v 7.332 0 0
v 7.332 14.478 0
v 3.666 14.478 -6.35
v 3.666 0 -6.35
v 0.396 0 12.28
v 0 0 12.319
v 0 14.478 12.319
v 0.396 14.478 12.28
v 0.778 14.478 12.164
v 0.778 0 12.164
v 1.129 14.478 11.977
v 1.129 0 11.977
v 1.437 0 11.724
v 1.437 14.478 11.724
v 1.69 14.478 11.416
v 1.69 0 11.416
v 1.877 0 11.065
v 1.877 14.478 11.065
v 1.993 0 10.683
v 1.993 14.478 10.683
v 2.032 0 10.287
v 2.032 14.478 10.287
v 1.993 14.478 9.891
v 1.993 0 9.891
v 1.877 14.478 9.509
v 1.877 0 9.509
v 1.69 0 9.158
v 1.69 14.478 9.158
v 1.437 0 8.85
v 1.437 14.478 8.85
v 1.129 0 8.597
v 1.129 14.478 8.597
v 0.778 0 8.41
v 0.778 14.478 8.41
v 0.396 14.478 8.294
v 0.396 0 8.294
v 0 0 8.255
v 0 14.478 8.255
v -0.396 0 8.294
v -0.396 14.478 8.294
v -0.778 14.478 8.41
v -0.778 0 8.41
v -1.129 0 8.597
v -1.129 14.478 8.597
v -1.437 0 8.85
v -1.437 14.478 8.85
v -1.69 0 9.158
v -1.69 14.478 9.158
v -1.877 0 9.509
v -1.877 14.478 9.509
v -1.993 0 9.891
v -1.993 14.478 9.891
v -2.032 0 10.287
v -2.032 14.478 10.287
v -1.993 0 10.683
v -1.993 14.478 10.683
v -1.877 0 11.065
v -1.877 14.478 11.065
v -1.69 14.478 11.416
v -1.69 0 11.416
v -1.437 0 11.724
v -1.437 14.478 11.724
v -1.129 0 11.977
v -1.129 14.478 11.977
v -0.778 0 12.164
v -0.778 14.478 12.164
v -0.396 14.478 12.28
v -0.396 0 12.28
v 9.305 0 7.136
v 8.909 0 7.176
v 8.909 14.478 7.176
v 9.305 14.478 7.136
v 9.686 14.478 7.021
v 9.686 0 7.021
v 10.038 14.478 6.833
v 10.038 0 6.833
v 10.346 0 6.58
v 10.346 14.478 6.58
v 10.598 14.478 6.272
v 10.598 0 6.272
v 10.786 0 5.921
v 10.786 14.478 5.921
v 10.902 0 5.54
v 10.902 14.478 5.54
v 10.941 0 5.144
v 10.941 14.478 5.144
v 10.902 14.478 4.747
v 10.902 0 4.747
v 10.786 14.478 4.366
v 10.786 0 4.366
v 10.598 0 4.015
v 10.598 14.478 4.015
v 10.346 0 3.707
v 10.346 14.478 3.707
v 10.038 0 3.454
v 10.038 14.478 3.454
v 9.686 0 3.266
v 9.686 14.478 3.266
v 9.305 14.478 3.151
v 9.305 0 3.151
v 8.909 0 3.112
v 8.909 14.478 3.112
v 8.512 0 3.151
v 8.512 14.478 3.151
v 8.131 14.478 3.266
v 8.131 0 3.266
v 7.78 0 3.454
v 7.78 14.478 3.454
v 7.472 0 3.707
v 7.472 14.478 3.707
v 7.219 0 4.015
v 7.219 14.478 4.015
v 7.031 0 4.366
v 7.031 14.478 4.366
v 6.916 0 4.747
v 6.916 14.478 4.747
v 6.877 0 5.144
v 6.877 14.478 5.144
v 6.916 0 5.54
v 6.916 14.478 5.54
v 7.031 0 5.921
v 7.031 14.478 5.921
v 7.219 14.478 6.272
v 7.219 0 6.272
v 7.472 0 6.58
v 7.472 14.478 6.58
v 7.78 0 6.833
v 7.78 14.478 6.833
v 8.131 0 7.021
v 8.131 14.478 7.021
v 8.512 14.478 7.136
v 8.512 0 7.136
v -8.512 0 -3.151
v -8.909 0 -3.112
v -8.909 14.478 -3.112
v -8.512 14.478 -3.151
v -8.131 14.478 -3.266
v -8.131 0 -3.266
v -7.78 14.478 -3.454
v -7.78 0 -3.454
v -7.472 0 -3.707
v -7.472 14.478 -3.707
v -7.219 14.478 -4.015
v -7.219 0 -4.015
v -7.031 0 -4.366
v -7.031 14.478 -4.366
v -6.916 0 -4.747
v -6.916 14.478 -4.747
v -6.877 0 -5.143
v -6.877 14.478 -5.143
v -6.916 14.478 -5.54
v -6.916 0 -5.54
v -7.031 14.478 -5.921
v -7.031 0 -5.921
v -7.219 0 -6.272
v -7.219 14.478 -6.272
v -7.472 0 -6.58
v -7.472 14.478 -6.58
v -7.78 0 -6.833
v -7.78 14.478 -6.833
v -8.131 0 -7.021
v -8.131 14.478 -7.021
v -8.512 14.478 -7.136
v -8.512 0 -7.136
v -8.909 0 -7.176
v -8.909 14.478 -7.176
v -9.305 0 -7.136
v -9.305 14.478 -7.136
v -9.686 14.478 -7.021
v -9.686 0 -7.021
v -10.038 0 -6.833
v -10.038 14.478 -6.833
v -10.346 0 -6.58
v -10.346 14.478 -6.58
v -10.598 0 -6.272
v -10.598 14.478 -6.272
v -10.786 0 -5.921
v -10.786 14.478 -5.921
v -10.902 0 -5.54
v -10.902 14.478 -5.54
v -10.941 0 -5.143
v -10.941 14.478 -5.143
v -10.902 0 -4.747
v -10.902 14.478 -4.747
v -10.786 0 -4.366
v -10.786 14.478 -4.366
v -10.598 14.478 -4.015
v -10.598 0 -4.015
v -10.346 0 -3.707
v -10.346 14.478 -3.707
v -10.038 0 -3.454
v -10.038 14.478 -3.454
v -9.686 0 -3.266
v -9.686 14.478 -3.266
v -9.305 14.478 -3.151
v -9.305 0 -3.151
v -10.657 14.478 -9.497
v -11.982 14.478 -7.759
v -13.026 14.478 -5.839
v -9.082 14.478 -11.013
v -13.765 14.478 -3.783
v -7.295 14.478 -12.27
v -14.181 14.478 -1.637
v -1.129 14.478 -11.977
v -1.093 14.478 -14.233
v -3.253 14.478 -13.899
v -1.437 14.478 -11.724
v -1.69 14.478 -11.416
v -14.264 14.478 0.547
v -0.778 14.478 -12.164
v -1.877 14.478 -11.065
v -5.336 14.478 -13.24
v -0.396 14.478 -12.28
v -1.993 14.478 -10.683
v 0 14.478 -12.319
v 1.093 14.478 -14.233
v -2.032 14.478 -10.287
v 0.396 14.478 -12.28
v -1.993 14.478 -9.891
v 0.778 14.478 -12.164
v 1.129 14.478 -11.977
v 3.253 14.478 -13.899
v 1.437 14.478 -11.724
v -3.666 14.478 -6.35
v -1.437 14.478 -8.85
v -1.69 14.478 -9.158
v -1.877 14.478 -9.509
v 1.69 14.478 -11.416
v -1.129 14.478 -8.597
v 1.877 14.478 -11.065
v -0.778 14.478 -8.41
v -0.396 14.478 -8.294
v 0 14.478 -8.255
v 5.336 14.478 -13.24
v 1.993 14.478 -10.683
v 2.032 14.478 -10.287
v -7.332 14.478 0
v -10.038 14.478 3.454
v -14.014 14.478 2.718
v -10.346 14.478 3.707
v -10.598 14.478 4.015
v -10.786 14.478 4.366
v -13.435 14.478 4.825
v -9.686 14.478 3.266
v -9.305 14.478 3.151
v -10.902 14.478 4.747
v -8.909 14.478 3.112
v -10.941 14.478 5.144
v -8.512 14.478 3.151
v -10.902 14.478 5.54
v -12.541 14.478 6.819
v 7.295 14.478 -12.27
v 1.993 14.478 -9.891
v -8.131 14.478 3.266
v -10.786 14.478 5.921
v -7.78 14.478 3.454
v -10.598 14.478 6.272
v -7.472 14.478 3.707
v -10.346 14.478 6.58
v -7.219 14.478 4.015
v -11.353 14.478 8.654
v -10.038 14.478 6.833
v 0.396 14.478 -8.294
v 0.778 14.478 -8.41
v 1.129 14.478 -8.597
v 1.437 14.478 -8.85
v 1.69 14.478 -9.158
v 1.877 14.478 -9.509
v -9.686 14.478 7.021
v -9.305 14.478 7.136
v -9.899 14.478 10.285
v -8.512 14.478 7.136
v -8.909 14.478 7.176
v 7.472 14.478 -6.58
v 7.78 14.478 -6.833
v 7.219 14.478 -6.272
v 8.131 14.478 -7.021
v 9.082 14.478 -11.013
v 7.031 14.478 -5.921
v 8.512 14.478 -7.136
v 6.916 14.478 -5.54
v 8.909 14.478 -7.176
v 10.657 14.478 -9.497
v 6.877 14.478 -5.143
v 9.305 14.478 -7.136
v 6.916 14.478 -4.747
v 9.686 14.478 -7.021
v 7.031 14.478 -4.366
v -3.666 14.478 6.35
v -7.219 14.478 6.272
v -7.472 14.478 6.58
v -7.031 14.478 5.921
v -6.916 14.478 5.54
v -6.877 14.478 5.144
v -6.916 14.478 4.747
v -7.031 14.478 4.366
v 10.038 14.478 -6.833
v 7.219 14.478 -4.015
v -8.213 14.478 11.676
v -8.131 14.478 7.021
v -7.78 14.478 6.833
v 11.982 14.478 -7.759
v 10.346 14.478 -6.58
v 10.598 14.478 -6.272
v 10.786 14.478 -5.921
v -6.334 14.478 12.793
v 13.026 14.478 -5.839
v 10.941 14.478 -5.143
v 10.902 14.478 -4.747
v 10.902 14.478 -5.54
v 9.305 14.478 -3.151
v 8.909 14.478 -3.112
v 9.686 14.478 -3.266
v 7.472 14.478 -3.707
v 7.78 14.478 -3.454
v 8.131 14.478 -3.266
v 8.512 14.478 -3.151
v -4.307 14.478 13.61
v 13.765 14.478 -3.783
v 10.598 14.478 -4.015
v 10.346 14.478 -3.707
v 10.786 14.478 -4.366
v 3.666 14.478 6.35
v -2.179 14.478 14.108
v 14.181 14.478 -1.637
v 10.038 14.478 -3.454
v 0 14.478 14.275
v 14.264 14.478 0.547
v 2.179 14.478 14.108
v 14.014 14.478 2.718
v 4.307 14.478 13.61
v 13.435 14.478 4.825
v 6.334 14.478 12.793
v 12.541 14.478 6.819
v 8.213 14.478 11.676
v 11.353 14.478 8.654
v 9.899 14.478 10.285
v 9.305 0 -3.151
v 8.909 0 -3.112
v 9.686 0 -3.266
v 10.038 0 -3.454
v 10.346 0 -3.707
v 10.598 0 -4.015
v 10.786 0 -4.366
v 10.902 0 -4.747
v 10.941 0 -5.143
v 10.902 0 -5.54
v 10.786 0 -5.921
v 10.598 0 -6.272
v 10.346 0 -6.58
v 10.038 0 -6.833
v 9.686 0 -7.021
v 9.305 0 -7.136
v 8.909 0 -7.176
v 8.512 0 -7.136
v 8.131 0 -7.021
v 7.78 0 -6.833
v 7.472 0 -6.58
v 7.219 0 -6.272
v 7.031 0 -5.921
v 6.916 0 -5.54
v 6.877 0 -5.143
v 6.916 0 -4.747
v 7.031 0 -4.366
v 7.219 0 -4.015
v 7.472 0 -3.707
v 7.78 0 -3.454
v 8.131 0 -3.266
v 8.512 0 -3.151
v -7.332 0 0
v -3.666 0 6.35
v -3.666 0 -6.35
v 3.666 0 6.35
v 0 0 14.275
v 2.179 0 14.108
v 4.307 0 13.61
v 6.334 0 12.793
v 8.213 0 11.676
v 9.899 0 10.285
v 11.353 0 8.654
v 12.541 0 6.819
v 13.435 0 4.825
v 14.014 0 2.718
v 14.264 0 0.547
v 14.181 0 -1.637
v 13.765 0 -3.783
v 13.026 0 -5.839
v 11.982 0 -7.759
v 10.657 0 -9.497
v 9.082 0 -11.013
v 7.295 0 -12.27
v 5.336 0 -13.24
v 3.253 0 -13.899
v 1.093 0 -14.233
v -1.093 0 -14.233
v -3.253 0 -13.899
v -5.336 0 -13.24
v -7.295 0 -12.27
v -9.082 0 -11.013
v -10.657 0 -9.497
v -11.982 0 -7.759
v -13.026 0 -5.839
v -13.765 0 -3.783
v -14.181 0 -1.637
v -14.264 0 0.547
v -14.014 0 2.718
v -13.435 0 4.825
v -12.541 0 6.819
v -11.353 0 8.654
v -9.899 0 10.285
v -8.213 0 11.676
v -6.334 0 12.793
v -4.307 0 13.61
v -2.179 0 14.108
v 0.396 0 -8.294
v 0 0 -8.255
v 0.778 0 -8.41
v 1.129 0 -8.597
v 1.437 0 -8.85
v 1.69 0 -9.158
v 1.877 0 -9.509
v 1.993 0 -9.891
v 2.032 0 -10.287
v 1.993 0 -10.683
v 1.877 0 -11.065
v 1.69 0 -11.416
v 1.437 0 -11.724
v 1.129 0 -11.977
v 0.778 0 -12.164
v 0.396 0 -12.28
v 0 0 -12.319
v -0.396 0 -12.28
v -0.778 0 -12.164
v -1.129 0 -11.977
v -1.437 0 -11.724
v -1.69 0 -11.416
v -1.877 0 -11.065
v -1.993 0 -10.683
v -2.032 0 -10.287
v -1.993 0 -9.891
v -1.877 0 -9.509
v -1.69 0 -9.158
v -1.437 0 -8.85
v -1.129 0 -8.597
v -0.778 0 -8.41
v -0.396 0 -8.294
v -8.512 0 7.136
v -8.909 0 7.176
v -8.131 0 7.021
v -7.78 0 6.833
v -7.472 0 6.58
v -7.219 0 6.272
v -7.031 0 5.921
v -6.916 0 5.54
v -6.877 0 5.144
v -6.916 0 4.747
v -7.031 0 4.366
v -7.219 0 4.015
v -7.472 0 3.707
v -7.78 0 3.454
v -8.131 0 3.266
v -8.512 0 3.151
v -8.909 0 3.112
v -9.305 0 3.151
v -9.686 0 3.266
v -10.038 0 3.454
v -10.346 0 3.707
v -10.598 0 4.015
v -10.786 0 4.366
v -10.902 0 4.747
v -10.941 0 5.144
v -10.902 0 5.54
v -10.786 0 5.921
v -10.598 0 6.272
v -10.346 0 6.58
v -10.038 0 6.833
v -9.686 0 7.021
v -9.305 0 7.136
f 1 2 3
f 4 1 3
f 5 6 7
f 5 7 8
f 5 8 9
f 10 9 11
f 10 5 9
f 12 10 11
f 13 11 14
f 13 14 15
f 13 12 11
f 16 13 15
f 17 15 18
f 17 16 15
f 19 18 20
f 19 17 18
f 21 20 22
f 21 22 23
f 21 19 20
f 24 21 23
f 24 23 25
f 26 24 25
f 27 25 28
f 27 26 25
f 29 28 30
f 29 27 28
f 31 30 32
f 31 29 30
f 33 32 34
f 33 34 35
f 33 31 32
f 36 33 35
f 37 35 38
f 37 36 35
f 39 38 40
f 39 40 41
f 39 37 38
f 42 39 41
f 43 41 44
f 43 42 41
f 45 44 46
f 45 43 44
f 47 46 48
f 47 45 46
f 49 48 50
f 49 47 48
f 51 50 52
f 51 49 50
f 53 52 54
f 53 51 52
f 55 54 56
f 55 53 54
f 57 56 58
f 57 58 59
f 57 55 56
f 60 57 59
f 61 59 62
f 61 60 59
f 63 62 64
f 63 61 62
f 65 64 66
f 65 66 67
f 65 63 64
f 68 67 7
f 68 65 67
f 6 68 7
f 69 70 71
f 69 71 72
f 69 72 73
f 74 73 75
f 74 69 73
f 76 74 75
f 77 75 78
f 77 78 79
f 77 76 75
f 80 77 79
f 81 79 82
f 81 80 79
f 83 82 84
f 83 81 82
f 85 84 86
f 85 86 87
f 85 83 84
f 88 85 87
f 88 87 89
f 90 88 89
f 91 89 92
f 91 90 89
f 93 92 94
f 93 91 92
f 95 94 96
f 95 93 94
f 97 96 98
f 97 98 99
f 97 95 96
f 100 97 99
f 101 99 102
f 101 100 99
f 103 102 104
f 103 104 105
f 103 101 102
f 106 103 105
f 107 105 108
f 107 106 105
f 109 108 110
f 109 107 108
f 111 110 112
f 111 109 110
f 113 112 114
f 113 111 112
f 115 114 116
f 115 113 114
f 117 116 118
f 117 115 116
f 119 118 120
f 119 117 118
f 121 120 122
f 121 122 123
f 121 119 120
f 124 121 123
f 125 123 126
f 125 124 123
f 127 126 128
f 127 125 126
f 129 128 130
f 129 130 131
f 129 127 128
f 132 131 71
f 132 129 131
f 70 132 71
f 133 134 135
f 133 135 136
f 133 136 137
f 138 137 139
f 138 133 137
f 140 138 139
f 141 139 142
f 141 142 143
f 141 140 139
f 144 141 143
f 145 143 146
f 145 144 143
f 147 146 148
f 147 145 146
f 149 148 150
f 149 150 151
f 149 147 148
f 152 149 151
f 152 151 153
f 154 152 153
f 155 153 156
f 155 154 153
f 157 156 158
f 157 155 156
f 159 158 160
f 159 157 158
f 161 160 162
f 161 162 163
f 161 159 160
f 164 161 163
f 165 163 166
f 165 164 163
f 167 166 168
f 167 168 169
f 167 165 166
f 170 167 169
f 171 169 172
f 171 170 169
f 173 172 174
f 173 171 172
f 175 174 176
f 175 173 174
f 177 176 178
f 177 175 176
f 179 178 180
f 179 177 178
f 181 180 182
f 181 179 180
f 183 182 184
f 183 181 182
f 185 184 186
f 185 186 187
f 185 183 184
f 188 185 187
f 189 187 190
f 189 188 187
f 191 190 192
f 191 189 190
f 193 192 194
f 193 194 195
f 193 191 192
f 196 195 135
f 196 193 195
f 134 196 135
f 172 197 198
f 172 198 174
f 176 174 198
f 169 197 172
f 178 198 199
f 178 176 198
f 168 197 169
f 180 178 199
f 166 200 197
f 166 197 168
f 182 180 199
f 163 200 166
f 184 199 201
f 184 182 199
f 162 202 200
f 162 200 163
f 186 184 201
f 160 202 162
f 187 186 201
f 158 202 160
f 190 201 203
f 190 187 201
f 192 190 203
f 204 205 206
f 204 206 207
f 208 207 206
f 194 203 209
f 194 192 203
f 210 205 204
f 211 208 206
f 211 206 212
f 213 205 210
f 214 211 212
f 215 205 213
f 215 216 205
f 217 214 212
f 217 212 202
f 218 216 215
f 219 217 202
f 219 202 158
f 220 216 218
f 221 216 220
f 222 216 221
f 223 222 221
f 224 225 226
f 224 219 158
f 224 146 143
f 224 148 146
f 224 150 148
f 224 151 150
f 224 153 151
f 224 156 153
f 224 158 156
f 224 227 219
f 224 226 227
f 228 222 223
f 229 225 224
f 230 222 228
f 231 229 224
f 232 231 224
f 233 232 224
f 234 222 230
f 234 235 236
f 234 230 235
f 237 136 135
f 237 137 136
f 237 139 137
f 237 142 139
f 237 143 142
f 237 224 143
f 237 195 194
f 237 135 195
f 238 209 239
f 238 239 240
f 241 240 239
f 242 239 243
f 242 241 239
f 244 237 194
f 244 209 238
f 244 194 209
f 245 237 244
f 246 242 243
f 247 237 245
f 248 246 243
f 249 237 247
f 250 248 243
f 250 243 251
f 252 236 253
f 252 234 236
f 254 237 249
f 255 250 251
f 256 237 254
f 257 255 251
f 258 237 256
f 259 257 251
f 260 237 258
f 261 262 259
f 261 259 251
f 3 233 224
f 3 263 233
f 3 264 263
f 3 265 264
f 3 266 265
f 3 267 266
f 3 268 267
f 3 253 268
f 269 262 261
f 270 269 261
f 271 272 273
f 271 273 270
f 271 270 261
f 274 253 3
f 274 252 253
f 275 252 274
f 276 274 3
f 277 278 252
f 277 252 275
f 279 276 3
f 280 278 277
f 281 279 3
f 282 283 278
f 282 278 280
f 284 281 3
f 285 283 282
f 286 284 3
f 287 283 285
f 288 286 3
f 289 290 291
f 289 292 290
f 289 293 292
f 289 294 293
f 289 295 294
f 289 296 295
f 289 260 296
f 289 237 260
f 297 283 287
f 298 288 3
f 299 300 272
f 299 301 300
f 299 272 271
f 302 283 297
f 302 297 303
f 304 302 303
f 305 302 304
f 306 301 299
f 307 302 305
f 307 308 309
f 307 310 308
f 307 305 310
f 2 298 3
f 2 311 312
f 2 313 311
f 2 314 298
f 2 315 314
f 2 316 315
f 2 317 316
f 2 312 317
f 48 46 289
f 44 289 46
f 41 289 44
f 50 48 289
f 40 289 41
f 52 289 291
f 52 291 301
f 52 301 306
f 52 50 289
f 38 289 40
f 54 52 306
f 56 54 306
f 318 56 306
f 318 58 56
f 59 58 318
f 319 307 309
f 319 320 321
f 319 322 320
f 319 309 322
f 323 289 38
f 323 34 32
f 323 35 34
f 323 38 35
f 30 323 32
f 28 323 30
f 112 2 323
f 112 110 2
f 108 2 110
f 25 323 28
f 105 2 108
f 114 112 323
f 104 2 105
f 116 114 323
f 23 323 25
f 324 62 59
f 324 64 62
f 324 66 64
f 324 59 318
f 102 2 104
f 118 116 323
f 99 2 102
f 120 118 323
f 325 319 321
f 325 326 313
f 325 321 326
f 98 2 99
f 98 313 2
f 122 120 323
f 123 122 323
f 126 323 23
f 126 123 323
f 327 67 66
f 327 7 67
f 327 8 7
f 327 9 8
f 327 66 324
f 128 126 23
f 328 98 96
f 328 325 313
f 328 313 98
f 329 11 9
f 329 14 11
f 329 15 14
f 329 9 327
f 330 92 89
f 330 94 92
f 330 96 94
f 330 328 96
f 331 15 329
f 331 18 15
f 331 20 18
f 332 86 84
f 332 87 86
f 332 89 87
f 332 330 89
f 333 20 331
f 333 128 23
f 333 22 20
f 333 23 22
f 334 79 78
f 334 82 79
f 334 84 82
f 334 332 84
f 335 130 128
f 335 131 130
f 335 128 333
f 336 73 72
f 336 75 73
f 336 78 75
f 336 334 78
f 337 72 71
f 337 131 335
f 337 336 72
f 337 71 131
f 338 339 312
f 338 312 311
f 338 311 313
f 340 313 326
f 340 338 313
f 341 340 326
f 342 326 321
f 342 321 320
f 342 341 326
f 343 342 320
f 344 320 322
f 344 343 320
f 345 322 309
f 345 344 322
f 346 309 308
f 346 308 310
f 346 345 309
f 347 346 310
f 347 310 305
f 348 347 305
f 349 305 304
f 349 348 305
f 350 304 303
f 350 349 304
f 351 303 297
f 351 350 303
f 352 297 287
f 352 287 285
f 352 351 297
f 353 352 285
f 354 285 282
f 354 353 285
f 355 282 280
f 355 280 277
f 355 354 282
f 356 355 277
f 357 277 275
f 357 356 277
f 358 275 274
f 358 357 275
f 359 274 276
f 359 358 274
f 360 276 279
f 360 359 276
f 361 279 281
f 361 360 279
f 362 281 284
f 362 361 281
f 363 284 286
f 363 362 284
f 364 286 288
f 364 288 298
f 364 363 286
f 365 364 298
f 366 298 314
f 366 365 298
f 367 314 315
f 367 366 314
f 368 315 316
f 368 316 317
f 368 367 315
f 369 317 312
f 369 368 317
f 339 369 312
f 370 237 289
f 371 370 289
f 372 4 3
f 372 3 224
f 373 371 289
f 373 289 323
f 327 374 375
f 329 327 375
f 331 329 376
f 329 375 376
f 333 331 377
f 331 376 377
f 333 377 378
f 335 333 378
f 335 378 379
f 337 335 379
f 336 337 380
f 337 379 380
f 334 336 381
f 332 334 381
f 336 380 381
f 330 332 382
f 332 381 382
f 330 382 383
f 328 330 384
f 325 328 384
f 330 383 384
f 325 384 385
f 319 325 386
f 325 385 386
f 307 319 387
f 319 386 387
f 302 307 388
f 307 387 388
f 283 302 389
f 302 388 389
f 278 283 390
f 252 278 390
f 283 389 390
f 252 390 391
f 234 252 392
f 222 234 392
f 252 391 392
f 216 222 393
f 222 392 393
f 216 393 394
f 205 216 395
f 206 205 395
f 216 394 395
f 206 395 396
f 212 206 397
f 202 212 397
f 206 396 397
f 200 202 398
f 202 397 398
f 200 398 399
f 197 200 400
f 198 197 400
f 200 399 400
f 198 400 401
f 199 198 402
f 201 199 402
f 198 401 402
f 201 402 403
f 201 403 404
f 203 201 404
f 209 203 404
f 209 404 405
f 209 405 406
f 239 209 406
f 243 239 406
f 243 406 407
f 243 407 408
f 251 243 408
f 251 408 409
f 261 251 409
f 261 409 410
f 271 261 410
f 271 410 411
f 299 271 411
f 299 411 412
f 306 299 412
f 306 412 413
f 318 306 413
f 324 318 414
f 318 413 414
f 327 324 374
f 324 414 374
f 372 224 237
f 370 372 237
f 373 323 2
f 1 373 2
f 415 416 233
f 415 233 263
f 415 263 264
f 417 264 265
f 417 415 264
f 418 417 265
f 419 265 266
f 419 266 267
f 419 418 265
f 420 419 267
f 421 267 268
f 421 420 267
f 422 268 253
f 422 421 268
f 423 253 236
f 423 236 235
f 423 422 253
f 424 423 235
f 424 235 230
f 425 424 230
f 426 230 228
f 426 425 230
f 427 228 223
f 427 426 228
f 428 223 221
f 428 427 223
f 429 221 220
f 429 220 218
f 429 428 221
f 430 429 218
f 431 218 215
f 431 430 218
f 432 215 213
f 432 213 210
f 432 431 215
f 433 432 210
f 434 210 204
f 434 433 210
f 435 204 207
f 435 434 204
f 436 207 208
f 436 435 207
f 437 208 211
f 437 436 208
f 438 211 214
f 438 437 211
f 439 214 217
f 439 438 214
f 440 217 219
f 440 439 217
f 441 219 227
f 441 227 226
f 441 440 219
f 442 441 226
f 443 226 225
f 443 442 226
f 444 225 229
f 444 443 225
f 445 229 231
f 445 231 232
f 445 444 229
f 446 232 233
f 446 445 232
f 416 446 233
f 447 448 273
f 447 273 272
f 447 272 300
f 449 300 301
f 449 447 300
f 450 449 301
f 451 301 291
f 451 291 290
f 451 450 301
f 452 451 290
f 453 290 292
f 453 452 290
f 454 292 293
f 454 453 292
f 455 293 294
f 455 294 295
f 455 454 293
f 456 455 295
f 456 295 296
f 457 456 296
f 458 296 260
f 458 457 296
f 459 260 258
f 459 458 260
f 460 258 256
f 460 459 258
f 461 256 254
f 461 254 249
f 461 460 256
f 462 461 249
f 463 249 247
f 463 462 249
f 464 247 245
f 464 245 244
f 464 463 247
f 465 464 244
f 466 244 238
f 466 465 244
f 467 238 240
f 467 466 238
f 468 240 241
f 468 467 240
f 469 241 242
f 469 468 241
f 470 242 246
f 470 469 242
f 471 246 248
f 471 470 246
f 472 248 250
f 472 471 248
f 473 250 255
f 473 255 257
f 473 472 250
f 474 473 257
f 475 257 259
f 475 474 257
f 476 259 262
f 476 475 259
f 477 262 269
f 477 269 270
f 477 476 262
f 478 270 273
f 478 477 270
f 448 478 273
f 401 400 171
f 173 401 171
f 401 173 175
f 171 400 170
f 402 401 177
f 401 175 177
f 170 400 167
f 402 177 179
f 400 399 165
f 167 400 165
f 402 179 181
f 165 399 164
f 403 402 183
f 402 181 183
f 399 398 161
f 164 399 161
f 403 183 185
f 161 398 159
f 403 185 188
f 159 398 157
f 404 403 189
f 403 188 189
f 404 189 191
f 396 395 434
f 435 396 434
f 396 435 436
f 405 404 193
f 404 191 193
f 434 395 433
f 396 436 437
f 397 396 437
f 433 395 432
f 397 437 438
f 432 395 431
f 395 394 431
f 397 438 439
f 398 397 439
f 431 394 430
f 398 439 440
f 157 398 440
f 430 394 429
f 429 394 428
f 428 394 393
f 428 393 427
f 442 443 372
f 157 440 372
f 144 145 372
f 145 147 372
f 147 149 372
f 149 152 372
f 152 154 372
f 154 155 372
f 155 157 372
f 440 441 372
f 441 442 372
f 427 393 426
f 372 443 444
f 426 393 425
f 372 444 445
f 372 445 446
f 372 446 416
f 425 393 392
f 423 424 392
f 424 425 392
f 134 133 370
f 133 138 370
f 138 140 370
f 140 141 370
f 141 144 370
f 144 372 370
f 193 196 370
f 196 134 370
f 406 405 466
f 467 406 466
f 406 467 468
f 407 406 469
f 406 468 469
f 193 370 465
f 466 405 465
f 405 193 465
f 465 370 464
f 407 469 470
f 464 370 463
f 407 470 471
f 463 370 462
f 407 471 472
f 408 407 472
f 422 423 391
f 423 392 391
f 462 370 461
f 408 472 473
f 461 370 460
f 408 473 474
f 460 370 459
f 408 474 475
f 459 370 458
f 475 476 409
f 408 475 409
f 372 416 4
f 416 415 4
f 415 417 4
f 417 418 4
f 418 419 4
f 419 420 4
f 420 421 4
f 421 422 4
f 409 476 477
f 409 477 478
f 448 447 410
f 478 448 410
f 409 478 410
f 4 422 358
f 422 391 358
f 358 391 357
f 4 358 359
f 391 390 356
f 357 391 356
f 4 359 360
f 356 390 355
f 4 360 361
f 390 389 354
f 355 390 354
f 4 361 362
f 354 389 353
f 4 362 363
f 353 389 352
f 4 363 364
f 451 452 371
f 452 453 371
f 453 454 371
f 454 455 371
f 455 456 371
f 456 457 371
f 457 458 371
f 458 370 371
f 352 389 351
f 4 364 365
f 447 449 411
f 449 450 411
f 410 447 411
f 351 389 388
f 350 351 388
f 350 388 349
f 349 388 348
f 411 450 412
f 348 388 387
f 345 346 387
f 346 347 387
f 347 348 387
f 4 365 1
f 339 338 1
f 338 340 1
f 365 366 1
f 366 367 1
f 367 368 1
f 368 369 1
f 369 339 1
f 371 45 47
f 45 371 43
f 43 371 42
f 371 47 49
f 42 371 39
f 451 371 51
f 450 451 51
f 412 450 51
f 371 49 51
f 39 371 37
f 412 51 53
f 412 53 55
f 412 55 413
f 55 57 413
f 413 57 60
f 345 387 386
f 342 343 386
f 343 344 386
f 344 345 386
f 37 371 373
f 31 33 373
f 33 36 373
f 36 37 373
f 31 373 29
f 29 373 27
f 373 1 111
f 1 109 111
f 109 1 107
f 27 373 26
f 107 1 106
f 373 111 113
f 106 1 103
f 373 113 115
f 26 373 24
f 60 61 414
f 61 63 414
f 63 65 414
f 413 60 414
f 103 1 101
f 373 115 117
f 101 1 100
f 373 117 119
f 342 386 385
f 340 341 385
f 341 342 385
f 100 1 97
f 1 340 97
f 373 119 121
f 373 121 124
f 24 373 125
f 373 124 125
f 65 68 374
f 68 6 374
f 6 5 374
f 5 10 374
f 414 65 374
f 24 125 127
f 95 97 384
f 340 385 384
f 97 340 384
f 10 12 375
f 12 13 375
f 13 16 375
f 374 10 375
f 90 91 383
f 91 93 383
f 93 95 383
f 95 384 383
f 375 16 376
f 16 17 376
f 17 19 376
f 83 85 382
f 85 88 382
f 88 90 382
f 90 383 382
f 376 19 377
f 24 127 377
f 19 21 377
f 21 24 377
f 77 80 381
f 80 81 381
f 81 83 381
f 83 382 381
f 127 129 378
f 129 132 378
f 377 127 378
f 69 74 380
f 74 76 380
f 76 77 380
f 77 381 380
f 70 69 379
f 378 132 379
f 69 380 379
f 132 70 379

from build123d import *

# Parameters (mm, degrees)
SKETCH1_R           = 14.2748
SKETCH1_R_2         = 2.032
BOSS_EXTRUDE1_DEPTH = 14.478


with BuildPart() as part:
    # Sketch1 → Boss-Extrude1 (new body)
    with BuildSketch(Plane(origin=(0, 0, 0), x_dir=(1, 0, 0), z_dir=(0, 1, 0))):
        with Locations(Location((0, 0, 0), (0, 0, 270))):
            Circle(SKETCH1_R)
        with Locations(Location((0, 10.287, 0), (0, 0, 270))):
            Circle(SKETCH1_R_2, mode=Mode.SUBTRACT)
        with Locations(Location((8.908803329, 5.1435, 0), (0, 0, 270))):
            Circle(SKETCH1_R_2, mode=Mode.SUBTRACT)
        with Locations(Location((8.908803329, -5.1435, 0), (0, 0, 270))):
            Circle(SKETCH1_R_2, mode=Mode.SUBTRACT)
        with Locations(Location((0, -10.287, 0), (0, 0, 270))):
            Circle(SKETCH1_R_2, mode=Mode.SUBTRACT)
        with Locations(Location((-8.908803329, -5.1435, 0), (0, 0, 270))):
            Circle(SKETCH1_R_2, mode=Mode.SUBTRACT)
        with Locations(Location((-8.908803329, 5.1435, 0), (0, 0, 270))):
            Circle(SKETCH1_R_2, mode=Mode.SUBTRACT)
        Polygon((7.332348419, 0), (3.666174209, 6.35), (-3.666174209, 6.35), (-7.332348419, 0), (-3.666174209, -6.35), (3.666174209, -6.35), align=None, mode=Mode.SUBTRACT)
    extrude(amount=BOSS_EXTRUDE1_DEPTH)


solid = part.part
